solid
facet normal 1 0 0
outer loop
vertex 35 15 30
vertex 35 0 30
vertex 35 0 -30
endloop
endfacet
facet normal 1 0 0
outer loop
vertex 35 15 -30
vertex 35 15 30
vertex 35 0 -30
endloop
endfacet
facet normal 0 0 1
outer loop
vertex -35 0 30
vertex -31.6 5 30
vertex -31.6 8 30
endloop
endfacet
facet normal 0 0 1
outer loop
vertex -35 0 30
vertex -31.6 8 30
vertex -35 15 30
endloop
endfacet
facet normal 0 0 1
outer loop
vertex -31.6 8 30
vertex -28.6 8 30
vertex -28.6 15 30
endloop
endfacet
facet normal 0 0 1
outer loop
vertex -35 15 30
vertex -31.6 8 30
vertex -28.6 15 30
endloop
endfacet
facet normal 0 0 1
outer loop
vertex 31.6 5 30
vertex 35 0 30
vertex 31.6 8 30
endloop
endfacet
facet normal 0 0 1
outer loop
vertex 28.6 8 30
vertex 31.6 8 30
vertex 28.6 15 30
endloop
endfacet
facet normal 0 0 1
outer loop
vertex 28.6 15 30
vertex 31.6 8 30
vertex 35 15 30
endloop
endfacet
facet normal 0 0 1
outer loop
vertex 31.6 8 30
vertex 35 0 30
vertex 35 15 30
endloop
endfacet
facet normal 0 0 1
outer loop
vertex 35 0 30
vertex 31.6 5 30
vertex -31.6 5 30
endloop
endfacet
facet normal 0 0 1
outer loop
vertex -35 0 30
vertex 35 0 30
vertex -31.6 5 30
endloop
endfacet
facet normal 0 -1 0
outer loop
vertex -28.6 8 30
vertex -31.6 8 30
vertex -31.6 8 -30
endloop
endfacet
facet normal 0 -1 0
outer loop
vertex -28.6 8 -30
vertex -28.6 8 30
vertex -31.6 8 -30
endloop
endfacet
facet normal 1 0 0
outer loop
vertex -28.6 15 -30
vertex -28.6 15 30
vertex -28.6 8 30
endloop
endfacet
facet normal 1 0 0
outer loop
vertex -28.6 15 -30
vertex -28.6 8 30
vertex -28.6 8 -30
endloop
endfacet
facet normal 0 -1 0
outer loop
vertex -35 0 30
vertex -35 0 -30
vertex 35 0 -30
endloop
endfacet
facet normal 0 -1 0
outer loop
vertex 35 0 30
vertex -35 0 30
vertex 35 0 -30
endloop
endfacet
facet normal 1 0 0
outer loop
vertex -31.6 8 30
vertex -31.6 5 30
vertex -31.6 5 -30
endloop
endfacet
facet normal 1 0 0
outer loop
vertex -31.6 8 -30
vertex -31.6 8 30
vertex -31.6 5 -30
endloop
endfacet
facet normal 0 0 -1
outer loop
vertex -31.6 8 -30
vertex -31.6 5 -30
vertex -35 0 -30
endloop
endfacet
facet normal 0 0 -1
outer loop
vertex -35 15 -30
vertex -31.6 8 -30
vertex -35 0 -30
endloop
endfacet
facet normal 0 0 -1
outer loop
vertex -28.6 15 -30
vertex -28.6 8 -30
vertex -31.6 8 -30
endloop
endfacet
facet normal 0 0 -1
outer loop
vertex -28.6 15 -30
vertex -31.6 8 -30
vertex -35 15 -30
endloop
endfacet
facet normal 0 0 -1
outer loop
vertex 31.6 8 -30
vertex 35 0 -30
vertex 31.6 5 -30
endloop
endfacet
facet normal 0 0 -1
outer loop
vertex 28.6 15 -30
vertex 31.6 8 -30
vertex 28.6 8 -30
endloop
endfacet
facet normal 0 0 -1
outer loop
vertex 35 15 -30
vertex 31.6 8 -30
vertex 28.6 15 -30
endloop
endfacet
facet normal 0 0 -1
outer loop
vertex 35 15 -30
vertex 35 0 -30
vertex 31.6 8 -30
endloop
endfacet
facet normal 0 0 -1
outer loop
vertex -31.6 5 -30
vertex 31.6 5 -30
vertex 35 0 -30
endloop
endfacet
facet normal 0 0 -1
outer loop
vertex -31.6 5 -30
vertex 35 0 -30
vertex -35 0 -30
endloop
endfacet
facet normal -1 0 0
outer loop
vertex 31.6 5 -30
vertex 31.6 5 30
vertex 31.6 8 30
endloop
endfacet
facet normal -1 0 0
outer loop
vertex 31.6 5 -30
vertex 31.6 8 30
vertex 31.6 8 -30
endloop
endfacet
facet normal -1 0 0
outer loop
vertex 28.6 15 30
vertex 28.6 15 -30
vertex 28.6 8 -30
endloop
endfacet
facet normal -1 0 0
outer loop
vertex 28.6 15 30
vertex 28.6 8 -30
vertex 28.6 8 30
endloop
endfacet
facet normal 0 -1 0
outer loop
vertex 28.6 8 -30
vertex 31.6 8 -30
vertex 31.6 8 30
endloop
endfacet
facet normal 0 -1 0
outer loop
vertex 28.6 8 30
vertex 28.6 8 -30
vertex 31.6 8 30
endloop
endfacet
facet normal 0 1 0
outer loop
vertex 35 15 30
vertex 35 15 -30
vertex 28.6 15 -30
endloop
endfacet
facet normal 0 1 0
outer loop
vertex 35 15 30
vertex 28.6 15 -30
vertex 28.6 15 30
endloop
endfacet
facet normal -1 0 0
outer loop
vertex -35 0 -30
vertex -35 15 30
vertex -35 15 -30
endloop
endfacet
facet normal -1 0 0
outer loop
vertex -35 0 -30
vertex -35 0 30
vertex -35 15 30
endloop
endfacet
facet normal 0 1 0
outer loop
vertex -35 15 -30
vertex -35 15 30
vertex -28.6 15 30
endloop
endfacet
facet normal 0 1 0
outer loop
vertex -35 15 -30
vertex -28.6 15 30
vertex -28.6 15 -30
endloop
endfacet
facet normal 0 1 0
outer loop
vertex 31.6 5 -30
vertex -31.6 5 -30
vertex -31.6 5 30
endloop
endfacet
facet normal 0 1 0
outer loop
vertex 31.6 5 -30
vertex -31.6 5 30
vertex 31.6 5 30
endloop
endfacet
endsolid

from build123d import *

# Parameters (mm, degrees)
SKETCH1_W           = 70
SKETCH1_H           = 60
BOSS_EXTRUDE1_DEPTH = 5
SKETCH2_W           = 3.4
SKETCH2_H           = 60
BOSS_EXTRUDE2_DEPTH = 10
SKETCH5_W           = 60
SKETCH5_H           = 7
BOSS_EXTRUDE5_DEPTH = 3
SKETCH6_W           = 60
SKETCH6_H           = 7
BOSS_EXTRUDE6_DEPTH = 3


with BuildPart() as part:
    # Sketch1 → Boss-Extrude1 (new body)
    with BuildSketch(Plane(origin=(0, 0, 0), x_dir=(1, 0, 0), z_dir=(0, 1, 0))):
        Rectangle(SKETCH1_W, SKETCH1_H)
    extrude(amount=BOSS_EXTRUDE1_DEPTH)

    # Sketch2 → Boss-Extrude2 (add)
    with BuildSketch(Plane(origin=(0, 5, 0), x_dir=(1, 0, 0), z_dir=(0, 1, 0))):
        with Locations((-33.3, 0)):
            Rectangle(SKETCH2_W, SKETCH2_H)
        with Locations((33.3, 0)):
            Rectangle(SKETCH2_W, SKETCH2_H)
    extrude(amount=BOSS_EXTRUDE2_DEPTH)

    # Sketch5 → Boss-Extrude5 (add)
    with BuildSketch(Plane(origin=(-31.6, 0, 0), x_dir=(0, 0, -1), z_dir=(1, 0, 0))):
        with Locations((0, 11.5)):
            Rectangle(SKETCH5_W, SKETCH5_H)
    extrude(amount=BOSS_EXTRUDE5_DEPTH)

    # Sketch6 → Boss-Extrude6 (add)
    with BuildSketch(Plane.ZY.offset(-31.6)):
        with Locations((0, 11.5)):
            Rectangle(SKETCH6_W, SKETCH6_H)
    extrude(amount=BOSS_EXTRUDE6_DEPTH)


solid = part.part
